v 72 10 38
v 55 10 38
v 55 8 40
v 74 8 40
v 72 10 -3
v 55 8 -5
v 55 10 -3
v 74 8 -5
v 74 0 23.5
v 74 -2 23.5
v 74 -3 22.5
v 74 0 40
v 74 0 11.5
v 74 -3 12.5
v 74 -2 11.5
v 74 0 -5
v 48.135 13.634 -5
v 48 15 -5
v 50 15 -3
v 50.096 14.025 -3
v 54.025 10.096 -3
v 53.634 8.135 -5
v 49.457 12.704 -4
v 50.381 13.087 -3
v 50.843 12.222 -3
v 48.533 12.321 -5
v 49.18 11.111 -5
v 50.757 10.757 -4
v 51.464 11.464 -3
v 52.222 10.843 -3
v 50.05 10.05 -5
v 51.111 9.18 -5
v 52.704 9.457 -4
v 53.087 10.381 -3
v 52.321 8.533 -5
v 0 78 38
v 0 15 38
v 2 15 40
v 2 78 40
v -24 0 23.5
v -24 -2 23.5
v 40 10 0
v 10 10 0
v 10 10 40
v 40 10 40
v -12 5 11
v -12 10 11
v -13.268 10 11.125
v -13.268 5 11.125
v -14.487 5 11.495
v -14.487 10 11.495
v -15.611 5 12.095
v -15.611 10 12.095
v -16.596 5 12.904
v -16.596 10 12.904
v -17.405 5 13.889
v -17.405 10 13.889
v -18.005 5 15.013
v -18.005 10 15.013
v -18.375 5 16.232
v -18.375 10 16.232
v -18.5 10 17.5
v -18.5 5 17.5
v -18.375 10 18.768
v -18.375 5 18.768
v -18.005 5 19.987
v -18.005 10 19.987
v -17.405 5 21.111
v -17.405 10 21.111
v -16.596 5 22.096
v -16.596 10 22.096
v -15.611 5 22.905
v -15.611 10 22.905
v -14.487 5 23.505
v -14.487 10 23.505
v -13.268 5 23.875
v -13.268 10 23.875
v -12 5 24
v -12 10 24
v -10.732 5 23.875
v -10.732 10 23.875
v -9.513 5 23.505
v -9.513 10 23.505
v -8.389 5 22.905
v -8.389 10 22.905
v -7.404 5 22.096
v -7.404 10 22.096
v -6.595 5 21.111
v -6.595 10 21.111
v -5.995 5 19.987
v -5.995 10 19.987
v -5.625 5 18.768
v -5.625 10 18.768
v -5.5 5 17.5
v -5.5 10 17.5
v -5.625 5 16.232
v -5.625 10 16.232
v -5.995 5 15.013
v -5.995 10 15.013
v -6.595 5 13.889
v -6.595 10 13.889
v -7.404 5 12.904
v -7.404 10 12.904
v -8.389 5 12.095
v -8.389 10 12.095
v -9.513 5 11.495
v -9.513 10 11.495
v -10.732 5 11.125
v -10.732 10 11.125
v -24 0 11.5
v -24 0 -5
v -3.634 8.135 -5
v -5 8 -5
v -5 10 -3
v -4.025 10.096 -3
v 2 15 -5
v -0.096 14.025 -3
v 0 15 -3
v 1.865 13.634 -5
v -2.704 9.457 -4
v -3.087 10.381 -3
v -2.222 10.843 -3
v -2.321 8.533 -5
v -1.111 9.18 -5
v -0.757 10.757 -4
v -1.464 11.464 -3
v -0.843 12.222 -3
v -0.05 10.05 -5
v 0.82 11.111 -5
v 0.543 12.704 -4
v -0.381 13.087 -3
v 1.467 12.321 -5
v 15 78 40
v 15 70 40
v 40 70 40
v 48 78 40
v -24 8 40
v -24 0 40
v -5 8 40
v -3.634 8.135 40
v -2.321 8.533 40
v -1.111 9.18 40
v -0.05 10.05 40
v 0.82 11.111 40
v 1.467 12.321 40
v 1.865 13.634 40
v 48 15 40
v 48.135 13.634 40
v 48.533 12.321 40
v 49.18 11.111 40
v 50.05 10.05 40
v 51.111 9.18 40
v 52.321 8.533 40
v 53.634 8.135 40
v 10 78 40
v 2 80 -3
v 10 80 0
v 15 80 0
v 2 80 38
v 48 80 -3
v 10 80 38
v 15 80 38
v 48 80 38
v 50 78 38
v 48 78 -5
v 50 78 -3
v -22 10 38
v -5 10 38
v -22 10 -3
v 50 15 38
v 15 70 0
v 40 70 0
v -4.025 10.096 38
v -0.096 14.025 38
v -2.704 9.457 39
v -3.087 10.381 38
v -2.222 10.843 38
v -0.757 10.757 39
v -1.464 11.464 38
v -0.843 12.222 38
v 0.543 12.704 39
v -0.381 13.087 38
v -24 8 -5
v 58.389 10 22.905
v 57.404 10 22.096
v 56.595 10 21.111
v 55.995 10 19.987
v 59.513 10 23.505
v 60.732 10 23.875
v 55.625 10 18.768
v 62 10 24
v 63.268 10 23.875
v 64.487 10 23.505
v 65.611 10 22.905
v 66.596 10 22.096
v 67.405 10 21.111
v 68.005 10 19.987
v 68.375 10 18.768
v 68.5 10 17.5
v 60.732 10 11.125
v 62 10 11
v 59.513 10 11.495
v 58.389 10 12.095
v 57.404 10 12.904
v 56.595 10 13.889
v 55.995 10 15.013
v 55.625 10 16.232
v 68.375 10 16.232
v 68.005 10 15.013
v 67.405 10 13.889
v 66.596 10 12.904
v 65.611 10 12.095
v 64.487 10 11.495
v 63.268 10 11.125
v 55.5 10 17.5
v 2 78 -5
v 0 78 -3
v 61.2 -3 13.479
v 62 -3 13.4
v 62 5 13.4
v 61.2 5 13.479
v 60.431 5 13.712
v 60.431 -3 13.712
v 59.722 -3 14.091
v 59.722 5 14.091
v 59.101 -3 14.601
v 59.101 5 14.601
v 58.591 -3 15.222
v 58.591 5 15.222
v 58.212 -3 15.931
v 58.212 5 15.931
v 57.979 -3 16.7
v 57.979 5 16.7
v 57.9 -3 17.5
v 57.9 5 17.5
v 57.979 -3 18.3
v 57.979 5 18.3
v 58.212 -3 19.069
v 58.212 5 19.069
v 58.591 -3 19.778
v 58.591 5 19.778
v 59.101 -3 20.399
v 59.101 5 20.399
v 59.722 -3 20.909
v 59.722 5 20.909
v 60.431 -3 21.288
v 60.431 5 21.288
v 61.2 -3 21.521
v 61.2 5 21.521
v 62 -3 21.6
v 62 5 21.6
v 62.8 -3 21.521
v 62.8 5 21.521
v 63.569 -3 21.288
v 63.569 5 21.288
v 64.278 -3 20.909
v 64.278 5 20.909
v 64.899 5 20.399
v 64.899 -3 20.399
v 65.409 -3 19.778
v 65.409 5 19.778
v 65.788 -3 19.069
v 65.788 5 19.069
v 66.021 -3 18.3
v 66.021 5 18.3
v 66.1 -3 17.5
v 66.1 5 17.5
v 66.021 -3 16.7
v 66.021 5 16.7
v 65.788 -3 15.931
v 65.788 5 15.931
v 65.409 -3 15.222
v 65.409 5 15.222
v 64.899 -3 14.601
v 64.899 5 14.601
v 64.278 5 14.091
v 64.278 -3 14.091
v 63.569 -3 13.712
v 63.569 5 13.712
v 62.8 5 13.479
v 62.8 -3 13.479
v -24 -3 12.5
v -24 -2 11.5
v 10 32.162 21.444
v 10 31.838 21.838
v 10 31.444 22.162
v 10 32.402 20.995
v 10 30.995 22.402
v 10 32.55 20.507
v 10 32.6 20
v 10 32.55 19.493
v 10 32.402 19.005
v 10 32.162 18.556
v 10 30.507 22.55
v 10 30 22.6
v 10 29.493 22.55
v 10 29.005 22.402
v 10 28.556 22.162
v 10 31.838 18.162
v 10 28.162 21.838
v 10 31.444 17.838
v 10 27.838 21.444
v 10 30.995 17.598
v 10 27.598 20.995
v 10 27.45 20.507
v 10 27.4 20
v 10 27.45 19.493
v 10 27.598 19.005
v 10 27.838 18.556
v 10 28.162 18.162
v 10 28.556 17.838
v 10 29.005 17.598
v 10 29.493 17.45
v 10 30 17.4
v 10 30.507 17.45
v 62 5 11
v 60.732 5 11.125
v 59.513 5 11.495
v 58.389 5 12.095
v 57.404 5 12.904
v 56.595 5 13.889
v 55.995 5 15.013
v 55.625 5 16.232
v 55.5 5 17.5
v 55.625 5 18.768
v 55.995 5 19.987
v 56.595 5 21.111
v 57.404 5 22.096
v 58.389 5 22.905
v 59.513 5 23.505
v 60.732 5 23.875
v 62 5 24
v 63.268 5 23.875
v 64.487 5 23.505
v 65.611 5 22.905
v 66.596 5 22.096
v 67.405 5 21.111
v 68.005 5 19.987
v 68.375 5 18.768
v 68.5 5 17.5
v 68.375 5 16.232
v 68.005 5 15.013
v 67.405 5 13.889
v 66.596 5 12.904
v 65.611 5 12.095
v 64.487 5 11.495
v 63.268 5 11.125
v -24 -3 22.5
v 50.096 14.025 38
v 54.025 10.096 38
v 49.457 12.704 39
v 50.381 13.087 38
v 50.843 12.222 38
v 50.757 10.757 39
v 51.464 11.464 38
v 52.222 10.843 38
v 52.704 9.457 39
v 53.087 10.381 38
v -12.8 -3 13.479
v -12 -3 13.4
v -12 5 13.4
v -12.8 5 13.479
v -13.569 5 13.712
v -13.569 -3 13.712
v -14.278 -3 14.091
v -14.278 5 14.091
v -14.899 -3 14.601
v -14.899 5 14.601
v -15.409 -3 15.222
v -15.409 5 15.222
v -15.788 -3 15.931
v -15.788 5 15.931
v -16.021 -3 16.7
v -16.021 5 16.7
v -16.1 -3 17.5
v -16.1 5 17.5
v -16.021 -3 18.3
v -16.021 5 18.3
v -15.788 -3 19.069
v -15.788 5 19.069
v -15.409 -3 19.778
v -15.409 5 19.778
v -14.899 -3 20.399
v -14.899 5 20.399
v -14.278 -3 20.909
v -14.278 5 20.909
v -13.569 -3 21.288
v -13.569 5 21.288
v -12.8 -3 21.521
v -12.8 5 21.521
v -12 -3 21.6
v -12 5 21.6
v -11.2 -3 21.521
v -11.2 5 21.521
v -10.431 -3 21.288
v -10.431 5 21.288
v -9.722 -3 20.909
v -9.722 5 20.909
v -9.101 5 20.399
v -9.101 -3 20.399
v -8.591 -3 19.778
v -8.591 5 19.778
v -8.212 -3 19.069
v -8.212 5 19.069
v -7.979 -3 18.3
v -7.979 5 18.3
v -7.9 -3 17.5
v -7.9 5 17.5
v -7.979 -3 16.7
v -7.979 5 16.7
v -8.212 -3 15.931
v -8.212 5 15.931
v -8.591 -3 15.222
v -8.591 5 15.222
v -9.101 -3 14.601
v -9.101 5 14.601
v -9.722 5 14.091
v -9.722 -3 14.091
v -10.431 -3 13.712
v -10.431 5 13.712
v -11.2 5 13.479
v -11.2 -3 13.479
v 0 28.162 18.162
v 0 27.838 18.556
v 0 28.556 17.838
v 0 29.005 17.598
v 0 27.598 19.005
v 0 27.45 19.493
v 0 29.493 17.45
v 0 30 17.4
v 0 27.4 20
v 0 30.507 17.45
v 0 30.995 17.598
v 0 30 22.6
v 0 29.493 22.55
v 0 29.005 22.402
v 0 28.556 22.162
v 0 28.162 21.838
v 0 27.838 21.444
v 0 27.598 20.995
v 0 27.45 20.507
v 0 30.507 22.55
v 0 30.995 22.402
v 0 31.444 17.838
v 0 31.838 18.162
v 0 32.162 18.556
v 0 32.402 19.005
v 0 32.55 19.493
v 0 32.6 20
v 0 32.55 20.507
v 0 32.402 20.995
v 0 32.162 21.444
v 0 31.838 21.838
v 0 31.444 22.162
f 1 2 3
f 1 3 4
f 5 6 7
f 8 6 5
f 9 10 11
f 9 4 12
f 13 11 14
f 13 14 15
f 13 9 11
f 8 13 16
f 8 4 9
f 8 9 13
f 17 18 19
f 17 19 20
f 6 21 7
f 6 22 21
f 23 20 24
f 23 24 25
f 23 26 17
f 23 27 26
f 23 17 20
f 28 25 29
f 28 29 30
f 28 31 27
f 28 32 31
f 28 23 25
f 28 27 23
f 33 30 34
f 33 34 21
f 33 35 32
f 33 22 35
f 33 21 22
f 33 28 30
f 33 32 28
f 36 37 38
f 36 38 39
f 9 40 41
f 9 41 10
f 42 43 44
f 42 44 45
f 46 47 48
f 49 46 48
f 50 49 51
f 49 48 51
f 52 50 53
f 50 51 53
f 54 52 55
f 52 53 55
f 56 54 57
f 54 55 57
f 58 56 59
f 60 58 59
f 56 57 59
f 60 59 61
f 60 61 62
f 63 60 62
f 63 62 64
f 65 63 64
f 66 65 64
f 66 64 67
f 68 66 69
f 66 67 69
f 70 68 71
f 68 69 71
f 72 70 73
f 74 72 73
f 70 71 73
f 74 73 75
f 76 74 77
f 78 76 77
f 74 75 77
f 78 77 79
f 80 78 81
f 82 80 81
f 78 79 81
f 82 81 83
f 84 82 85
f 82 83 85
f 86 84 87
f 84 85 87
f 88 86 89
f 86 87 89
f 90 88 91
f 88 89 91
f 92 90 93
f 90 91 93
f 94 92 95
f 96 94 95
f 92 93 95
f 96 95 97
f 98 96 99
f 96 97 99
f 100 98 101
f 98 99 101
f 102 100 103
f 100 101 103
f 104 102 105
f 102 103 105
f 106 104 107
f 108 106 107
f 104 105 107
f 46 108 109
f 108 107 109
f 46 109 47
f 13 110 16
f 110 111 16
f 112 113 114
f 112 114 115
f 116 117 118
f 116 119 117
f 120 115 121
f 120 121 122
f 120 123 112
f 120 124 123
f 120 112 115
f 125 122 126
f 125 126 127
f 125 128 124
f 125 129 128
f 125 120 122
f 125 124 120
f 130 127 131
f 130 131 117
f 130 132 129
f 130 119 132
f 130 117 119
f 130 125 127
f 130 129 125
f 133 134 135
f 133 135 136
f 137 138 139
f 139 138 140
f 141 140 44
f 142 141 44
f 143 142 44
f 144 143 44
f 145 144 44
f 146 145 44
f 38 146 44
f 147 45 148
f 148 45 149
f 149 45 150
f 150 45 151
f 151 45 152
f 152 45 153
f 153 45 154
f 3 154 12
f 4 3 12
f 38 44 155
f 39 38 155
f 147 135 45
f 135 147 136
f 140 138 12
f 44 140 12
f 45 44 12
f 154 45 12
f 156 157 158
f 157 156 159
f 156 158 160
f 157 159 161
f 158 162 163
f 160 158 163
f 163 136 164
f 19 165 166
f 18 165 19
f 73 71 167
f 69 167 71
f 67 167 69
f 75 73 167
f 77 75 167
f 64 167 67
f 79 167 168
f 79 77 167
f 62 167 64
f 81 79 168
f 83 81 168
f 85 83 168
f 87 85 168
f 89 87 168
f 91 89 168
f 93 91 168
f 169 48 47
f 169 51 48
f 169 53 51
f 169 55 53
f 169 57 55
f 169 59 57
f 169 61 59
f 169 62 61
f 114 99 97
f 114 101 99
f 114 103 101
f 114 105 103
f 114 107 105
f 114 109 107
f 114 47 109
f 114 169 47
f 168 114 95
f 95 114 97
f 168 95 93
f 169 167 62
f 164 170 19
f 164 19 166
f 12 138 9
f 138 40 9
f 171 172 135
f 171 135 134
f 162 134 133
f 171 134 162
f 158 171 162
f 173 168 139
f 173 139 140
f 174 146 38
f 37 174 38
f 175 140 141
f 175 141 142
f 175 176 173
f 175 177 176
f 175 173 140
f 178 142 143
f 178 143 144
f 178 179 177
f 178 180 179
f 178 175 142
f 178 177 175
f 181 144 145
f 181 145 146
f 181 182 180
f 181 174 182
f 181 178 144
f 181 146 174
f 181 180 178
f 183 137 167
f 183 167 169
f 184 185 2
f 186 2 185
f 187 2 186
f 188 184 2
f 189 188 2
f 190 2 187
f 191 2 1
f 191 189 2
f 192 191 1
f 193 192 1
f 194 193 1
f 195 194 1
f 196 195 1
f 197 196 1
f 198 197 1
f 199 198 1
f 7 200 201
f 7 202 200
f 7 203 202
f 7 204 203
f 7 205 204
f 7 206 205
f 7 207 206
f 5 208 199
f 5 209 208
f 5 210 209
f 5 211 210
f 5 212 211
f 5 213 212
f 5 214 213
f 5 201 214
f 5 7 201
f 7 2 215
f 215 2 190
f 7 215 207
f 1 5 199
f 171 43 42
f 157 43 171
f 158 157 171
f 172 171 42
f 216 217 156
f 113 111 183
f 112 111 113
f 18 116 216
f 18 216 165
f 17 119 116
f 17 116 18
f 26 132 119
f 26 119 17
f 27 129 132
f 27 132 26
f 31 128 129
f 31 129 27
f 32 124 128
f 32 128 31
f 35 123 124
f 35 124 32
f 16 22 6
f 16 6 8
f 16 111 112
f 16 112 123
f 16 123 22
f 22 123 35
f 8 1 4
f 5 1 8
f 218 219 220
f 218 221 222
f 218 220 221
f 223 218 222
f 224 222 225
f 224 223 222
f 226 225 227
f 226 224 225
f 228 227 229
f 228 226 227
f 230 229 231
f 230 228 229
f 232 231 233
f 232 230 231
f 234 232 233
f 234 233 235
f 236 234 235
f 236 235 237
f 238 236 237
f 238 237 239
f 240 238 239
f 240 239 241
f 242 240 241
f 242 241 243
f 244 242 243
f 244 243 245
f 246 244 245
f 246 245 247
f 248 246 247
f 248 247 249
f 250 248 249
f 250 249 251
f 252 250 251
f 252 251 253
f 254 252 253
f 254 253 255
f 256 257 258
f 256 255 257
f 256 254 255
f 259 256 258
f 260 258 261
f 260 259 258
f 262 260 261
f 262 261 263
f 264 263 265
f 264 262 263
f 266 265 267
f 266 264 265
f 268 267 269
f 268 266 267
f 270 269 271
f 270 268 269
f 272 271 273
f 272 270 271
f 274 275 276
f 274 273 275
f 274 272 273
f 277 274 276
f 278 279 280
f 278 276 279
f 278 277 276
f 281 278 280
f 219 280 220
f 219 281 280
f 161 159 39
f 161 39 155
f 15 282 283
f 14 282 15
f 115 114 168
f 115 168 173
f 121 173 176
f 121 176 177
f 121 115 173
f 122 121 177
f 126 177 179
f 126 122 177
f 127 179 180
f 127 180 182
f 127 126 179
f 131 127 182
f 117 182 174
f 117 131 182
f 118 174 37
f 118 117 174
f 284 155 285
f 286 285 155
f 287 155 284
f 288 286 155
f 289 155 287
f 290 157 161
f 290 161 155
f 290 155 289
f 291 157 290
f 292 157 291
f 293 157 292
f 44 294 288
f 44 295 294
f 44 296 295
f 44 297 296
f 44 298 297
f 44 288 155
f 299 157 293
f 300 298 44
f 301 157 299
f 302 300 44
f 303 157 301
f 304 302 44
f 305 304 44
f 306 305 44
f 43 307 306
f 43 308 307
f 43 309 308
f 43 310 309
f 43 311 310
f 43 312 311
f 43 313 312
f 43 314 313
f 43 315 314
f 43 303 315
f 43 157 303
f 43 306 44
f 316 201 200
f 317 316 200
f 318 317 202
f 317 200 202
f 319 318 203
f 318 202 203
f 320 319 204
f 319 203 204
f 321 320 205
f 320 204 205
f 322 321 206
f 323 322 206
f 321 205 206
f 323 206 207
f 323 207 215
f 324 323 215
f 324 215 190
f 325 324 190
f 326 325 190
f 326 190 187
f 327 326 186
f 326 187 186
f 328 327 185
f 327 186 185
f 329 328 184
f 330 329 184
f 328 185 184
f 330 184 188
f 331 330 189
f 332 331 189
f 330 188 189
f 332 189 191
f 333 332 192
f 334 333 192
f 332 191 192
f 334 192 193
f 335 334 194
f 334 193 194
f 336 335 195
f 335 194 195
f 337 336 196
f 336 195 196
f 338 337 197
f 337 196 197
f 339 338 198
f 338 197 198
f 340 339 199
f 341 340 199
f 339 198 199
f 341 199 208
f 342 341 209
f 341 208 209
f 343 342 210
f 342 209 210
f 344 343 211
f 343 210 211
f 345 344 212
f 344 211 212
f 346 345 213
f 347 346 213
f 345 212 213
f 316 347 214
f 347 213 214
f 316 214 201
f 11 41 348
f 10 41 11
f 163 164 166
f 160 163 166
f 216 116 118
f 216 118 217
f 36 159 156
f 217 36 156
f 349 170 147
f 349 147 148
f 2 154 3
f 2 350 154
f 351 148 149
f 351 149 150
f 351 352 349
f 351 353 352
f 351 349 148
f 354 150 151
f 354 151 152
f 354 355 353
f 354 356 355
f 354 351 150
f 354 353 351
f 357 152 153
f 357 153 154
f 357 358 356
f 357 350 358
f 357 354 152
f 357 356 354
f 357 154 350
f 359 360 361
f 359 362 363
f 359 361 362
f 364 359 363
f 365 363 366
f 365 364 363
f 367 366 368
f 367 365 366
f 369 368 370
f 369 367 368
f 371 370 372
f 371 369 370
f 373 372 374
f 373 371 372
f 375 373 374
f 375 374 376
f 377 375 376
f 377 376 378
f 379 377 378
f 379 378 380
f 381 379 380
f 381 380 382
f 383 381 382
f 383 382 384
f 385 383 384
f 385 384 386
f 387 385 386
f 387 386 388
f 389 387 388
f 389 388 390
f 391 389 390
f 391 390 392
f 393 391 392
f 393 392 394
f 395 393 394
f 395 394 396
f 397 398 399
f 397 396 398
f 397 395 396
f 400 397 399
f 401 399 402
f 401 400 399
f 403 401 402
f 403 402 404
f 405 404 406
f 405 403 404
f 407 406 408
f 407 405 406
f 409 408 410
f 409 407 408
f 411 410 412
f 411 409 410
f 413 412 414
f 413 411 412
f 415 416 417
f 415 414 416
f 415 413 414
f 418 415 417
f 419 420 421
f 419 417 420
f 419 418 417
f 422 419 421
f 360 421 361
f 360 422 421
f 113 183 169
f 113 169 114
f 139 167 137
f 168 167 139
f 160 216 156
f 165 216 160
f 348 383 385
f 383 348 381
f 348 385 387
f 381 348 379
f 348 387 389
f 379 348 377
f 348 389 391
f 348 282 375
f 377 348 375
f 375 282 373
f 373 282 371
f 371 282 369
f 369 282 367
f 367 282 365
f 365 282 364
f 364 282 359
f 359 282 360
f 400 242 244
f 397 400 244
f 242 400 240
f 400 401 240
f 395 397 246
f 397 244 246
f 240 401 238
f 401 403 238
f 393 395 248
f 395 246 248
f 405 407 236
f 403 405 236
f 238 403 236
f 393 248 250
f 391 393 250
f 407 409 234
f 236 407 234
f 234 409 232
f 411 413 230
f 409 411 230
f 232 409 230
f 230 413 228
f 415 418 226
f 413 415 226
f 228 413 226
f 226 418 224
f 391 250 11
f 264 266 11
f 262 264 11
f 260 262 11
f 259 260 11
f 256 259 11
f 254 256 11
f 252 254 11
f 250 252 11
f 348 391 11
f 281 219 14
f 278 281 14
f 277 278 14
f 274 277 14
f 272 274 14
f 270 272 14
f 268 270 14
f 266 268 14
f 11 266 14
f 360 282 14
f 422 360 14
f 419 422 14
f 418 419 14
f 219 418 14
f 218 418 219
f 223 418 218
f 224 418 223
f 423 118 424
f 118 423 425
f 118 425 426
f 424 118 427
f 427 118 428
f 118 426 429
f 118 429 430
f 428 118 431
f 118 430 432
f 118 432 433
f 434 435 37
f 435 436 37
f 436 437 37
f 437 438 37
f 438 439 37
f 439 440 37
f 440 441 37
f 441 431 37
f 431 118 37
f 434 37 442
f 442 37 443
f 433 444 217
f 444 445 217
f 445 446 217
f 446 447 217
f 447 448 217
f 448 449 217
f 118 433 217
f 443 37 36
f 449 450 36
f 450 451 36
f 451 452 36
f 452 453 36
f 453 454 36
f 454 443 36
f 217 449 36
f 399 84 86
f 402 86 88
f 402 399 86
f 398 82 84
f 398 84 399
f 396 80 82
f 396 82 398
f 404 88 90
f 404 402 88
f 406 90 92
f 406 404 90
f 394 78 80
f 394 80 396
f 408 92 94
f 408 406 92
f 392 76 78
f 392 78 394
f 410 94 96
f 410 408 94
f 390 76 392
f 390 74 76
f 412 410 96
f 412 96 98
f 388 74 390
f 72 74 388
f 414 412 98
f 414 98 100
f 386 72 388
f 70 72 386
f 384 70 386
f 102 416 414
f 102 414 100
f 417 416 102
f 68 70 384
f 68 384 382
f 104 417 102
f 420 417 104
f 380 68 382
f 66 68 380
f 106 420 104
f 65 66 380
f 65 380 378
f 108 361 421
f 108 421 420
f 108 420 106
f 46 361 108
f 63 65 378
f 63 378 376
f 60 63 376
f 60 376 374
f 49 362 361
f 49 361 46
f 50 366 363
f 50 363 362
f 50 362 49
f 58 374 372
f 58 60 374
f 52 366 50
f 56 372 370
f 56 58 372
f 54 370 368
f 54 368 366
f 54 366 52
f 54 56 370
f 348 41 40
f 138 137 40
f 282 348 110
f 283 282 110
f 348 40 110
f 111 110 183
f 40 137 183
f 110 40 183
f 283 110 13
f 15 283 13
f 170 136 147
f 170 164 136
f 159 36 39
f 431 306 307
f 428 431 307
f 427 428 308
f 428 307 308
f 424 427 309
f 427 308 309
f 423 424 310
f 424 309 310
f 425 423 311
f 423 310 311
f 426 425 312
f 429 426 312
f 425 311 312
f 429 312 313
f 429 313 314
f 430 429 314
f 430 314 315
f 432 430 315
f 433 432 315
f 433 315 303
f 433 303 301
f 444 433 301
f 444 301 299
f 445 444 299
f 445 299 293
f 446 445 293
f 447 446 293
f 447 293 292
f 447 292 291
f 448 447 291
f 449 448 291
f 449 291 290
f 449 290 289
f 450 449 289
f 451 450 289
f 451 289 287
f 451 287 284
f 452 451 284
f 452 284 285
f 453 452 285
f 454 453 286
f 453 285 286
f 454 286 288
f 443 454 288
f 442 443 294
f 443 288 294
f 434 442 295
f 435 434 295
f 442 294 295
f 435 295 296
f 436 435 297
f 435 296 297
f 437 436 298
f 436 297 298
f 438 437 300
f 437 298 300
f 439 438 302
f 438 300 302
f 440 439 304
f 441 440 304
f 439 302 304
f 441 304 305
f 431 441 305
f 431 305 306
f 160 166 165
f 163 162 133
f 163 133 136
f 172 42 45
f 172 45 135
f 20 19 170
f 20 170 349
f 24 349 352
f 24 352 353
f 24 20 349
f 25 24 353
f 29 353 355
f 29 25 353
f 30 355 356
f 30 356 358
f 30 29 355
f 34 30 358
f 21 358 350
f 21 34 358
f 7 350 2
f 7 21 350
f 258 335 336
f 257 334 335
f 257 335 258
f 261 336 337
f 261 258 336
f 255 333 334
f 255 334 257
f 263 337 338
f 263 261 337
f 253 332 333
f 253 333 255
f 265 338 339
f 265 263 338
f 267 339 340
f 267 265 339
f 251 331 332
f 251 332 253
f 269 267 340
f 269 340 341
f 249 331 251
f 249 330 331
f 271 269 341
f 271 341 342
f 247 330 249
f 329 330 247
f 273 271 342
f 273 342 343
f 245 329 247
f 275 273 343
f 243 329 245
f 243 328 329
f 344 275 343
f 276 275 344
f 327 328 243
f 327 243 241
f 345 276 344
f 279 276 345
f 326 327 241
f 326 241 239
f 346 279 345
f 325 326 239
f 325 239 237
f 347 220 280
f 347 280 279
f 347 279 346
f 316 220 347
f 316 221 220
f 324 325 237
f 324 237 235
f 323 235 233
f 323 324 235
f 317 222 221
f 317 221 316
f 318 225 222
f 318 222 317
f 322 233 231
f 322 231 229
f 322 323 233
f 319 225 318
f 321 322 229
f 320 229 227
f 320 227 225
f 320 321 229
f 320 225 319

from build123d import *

# Parameters (mm, degrees)
BOSS_EXTRUDE1_DEPTH     = 40
CUT_EXTRUDE1_START      = 10
SKETCH2_R               = 2.6
CUT_EXTRUDE1_DEPTH      = 113.46950766
SKETCH9_W               = 50
SKETCH9_H               = 80
BOSS_EXTRUDE2_DEPTH     = 5
SKETCH11_W              = 24
SKETCH11_H              = 45
BOSS_EXTRUDE3_DEPTH     = 10
CUT_EXTRUDE2_DEPTH      = 117.086174887
CUT_EXTRUDE2_DEPTH_BACK = 117.086174887
SKETCH12_R              = 4.1
CUT_EXTRUDE3_START      = 10
SKETCH13_R              = 6.5
CUT_EXTRUDE3_DEPTH      = 5
FILLET2_R               = 5
CHAMFER1_SIZE           = 2
SKETCH14_W              = 98
SKETCH14_H              = 12
BOSS_EXTRUDE4_DEPTH     = 3
CUT_EXTRUDE4_DEPTH      = 117.086174887
CUT_EXTRUDE4_DEPTH_BACK = 117.086174887
SKETCH12_2_R            = 4.1
CHAMFER2_SIZE           = 1


with BuildPart() as part:
    # Sketch1 → Boss-Extrude1 (new body)
    with BuildSketch(Plane.XY):
        Polygon((0, 0), (0, 80), (10, 80), (10, 10), (40, 10), (40, 70), (15, 70), (15, 80), (50, 80), (50, 0), align=None)
    extrude(amount=BOSS_EXTRUDE1_DEPTH)

    # Sketch2 → Cut-Extrude1 (cut, through all)
    with BuildSketch(Plane(origin=(0, 0, 0), x_dir=(0, 0, -1), z_dir=(1, 0, 0)).offset(CUT_EXTRUDE1_START)):
        with Locations(Location((-20, 30, 0), (0, 0, 270))):
            Circle(SKETCH2_R)
    extrude(amount=-CUT_EXTRUDE1_DEPTH, mode=Mode.SUBTRACT)

    # Sketch9 → Boss-Extrude2 (add)
    with BuildSketch(Plane.XY):
        with Locations((25, 40)):
            Rectangle(SKETCH9_W, SKETCH9_H)
    extrude(amount=-BOSS_EXTRUDE2_DEPTH)

    # Sketch11 → Boss-Extrude3 (add)
    with BuildSketch(Plane(origin=(0, 0, 0), x_dir=(1, 0, 0), z_dir=(0, 1, 0))):
        with Locations((62, -17.5)):
            Rectangle(SKETCH11_W, SKETCH11_H)
        with Locations((-12, -17.5)):
            Rectangle(SKETCH11_W, SKETCH11_H)
    extrude(amount=BOSS_EXTRUDE3_DEPTH)

    # Sketch12 → Cut-Extrude2 (cut, two sides: drawn at the far end of the back side and taken through both)
    with BuildSketch(Plane(origin=(0, 0, 0), x_dir=(1, 0, 0), z_dir=(0, 1, 0)).offset(-CUT_EXTRUDE2_DEPTH_BACK)):
        with Locations(Location((-12, -17.5, 0), (0, 0, 90))):
            Circle(SKETCH12_R)
        with Locations(Location((62, -17.5, 0), (0, 0, 90))):
            Circle(SKETCH12_R)
    extrude(amount=CUT_EXTRUDE2_DEPTH + CUT_EXTRUDE2_DEPTH_BACK, mode=Mode.SUBTRACT)

    # Sketch13 → Cut-Extrude3 (cut)
    with BuildSketch(Plane(origin=(0, 0, 0), x_dir=(1, 0, 0), z_dir=(0, 1, 0)).offset(CUT_EXTRUDE3_START)):
        with Locations(Location((-12, -17.5, 0), (0, 0, 90))):
            Circle(SKETCH13_R)
        with Locations(Location((62, -17.5, 0), (0, 0, 90))):
            Circle(SKETCH13_R)
    extrude(amount=-CUT_EXTRUDE3_DEPTH, mode=Mode.SUBTRACT)

    # Fillet2
    fillet2_edges = [part.edges().sort_by_distance(p)[0] for p in [
        (0, 10, 17.5),
        (50, 10, 17.5),
    ]]
    fillet(fillet2_edges, radius=FILLET2_R)

    # Chamfer1
    chamfer1_edges = [part.edges().sort_by_distance(p)[0] for p in [
        (-14.5, 10, 40),
        (51.464466094, 11.464466094, -5),
        (51.464466094, 11.464466094, 40),
        (-1.464466094, 11.464466094, 40),
        (-1.464466094, 11.464466094, -5),
        (32.5, 80, 40),
        (0, 80, 17.5),
        (50, 80, 17.5),
        (25, 80, -5),
        (0, 47.5, -5),
        (5, 80, 40),
        (0, 47.5, 40),
        (-24, 10, 17.5),
        (-14.5, 10, -5),
        (74, 10, 17.5),
        (64.5, 10, 40),
        (50, 47.5, 40),
        (50, 47.5, -5),
        (64.5, 10, -5),
    ]]
    chamfer(chamfer1_edges, length=CHAMFER1_SIZE)

    # Sketch14 → Boss-Extrude4 (add)
    with BuildSketch(Plane(origin=(0, 0, 0), x_dir=(1, 0, 0), z_dir=(0, 1, 0))):
        with Locations((25, -17.5)):
            Rectangle(SKETCH14_W, SKETCH14_H)
    extrude(amount=-BOSS_EXTRUDE4_DEPTH)

    # Sketch12<2> → Cut-Extrude4 (cut, two sides: drawn at the far end of the back side and taken through both)
    with BuildSketch(Plane(origin=(0, 0, 0), x_dir=(1, 0, 0), z_dir=(0, 1, 0)).offset(-CUT_EXTRUDE4_DEPTH_BACK)):
        with Locations(Location((-12, -17.5, 0), (0, 0, 90))):
            Circle(SKETCH12_2_R)
        with Locations(Location((62, -17.5, 0), (0, 0, 90))):
            Circle(SKETCH12_2_R)
    extrude(amount=CUT_EXTRUDE4_DEPTH + CUT_EXTRUDE4_DEPTH_BACK, mode=Mode.SUBTRACT)

    # Chamfer2
    chamfer2_edges = [part.edges().sort_by_distance(p)[0] for p in [
        (25, -3, 11.5),
        (25, -3, 23.5),
    ]]
    chamfer(chamfer2_edges, length=CHAMFER2_SIZE)


solid = part.part
